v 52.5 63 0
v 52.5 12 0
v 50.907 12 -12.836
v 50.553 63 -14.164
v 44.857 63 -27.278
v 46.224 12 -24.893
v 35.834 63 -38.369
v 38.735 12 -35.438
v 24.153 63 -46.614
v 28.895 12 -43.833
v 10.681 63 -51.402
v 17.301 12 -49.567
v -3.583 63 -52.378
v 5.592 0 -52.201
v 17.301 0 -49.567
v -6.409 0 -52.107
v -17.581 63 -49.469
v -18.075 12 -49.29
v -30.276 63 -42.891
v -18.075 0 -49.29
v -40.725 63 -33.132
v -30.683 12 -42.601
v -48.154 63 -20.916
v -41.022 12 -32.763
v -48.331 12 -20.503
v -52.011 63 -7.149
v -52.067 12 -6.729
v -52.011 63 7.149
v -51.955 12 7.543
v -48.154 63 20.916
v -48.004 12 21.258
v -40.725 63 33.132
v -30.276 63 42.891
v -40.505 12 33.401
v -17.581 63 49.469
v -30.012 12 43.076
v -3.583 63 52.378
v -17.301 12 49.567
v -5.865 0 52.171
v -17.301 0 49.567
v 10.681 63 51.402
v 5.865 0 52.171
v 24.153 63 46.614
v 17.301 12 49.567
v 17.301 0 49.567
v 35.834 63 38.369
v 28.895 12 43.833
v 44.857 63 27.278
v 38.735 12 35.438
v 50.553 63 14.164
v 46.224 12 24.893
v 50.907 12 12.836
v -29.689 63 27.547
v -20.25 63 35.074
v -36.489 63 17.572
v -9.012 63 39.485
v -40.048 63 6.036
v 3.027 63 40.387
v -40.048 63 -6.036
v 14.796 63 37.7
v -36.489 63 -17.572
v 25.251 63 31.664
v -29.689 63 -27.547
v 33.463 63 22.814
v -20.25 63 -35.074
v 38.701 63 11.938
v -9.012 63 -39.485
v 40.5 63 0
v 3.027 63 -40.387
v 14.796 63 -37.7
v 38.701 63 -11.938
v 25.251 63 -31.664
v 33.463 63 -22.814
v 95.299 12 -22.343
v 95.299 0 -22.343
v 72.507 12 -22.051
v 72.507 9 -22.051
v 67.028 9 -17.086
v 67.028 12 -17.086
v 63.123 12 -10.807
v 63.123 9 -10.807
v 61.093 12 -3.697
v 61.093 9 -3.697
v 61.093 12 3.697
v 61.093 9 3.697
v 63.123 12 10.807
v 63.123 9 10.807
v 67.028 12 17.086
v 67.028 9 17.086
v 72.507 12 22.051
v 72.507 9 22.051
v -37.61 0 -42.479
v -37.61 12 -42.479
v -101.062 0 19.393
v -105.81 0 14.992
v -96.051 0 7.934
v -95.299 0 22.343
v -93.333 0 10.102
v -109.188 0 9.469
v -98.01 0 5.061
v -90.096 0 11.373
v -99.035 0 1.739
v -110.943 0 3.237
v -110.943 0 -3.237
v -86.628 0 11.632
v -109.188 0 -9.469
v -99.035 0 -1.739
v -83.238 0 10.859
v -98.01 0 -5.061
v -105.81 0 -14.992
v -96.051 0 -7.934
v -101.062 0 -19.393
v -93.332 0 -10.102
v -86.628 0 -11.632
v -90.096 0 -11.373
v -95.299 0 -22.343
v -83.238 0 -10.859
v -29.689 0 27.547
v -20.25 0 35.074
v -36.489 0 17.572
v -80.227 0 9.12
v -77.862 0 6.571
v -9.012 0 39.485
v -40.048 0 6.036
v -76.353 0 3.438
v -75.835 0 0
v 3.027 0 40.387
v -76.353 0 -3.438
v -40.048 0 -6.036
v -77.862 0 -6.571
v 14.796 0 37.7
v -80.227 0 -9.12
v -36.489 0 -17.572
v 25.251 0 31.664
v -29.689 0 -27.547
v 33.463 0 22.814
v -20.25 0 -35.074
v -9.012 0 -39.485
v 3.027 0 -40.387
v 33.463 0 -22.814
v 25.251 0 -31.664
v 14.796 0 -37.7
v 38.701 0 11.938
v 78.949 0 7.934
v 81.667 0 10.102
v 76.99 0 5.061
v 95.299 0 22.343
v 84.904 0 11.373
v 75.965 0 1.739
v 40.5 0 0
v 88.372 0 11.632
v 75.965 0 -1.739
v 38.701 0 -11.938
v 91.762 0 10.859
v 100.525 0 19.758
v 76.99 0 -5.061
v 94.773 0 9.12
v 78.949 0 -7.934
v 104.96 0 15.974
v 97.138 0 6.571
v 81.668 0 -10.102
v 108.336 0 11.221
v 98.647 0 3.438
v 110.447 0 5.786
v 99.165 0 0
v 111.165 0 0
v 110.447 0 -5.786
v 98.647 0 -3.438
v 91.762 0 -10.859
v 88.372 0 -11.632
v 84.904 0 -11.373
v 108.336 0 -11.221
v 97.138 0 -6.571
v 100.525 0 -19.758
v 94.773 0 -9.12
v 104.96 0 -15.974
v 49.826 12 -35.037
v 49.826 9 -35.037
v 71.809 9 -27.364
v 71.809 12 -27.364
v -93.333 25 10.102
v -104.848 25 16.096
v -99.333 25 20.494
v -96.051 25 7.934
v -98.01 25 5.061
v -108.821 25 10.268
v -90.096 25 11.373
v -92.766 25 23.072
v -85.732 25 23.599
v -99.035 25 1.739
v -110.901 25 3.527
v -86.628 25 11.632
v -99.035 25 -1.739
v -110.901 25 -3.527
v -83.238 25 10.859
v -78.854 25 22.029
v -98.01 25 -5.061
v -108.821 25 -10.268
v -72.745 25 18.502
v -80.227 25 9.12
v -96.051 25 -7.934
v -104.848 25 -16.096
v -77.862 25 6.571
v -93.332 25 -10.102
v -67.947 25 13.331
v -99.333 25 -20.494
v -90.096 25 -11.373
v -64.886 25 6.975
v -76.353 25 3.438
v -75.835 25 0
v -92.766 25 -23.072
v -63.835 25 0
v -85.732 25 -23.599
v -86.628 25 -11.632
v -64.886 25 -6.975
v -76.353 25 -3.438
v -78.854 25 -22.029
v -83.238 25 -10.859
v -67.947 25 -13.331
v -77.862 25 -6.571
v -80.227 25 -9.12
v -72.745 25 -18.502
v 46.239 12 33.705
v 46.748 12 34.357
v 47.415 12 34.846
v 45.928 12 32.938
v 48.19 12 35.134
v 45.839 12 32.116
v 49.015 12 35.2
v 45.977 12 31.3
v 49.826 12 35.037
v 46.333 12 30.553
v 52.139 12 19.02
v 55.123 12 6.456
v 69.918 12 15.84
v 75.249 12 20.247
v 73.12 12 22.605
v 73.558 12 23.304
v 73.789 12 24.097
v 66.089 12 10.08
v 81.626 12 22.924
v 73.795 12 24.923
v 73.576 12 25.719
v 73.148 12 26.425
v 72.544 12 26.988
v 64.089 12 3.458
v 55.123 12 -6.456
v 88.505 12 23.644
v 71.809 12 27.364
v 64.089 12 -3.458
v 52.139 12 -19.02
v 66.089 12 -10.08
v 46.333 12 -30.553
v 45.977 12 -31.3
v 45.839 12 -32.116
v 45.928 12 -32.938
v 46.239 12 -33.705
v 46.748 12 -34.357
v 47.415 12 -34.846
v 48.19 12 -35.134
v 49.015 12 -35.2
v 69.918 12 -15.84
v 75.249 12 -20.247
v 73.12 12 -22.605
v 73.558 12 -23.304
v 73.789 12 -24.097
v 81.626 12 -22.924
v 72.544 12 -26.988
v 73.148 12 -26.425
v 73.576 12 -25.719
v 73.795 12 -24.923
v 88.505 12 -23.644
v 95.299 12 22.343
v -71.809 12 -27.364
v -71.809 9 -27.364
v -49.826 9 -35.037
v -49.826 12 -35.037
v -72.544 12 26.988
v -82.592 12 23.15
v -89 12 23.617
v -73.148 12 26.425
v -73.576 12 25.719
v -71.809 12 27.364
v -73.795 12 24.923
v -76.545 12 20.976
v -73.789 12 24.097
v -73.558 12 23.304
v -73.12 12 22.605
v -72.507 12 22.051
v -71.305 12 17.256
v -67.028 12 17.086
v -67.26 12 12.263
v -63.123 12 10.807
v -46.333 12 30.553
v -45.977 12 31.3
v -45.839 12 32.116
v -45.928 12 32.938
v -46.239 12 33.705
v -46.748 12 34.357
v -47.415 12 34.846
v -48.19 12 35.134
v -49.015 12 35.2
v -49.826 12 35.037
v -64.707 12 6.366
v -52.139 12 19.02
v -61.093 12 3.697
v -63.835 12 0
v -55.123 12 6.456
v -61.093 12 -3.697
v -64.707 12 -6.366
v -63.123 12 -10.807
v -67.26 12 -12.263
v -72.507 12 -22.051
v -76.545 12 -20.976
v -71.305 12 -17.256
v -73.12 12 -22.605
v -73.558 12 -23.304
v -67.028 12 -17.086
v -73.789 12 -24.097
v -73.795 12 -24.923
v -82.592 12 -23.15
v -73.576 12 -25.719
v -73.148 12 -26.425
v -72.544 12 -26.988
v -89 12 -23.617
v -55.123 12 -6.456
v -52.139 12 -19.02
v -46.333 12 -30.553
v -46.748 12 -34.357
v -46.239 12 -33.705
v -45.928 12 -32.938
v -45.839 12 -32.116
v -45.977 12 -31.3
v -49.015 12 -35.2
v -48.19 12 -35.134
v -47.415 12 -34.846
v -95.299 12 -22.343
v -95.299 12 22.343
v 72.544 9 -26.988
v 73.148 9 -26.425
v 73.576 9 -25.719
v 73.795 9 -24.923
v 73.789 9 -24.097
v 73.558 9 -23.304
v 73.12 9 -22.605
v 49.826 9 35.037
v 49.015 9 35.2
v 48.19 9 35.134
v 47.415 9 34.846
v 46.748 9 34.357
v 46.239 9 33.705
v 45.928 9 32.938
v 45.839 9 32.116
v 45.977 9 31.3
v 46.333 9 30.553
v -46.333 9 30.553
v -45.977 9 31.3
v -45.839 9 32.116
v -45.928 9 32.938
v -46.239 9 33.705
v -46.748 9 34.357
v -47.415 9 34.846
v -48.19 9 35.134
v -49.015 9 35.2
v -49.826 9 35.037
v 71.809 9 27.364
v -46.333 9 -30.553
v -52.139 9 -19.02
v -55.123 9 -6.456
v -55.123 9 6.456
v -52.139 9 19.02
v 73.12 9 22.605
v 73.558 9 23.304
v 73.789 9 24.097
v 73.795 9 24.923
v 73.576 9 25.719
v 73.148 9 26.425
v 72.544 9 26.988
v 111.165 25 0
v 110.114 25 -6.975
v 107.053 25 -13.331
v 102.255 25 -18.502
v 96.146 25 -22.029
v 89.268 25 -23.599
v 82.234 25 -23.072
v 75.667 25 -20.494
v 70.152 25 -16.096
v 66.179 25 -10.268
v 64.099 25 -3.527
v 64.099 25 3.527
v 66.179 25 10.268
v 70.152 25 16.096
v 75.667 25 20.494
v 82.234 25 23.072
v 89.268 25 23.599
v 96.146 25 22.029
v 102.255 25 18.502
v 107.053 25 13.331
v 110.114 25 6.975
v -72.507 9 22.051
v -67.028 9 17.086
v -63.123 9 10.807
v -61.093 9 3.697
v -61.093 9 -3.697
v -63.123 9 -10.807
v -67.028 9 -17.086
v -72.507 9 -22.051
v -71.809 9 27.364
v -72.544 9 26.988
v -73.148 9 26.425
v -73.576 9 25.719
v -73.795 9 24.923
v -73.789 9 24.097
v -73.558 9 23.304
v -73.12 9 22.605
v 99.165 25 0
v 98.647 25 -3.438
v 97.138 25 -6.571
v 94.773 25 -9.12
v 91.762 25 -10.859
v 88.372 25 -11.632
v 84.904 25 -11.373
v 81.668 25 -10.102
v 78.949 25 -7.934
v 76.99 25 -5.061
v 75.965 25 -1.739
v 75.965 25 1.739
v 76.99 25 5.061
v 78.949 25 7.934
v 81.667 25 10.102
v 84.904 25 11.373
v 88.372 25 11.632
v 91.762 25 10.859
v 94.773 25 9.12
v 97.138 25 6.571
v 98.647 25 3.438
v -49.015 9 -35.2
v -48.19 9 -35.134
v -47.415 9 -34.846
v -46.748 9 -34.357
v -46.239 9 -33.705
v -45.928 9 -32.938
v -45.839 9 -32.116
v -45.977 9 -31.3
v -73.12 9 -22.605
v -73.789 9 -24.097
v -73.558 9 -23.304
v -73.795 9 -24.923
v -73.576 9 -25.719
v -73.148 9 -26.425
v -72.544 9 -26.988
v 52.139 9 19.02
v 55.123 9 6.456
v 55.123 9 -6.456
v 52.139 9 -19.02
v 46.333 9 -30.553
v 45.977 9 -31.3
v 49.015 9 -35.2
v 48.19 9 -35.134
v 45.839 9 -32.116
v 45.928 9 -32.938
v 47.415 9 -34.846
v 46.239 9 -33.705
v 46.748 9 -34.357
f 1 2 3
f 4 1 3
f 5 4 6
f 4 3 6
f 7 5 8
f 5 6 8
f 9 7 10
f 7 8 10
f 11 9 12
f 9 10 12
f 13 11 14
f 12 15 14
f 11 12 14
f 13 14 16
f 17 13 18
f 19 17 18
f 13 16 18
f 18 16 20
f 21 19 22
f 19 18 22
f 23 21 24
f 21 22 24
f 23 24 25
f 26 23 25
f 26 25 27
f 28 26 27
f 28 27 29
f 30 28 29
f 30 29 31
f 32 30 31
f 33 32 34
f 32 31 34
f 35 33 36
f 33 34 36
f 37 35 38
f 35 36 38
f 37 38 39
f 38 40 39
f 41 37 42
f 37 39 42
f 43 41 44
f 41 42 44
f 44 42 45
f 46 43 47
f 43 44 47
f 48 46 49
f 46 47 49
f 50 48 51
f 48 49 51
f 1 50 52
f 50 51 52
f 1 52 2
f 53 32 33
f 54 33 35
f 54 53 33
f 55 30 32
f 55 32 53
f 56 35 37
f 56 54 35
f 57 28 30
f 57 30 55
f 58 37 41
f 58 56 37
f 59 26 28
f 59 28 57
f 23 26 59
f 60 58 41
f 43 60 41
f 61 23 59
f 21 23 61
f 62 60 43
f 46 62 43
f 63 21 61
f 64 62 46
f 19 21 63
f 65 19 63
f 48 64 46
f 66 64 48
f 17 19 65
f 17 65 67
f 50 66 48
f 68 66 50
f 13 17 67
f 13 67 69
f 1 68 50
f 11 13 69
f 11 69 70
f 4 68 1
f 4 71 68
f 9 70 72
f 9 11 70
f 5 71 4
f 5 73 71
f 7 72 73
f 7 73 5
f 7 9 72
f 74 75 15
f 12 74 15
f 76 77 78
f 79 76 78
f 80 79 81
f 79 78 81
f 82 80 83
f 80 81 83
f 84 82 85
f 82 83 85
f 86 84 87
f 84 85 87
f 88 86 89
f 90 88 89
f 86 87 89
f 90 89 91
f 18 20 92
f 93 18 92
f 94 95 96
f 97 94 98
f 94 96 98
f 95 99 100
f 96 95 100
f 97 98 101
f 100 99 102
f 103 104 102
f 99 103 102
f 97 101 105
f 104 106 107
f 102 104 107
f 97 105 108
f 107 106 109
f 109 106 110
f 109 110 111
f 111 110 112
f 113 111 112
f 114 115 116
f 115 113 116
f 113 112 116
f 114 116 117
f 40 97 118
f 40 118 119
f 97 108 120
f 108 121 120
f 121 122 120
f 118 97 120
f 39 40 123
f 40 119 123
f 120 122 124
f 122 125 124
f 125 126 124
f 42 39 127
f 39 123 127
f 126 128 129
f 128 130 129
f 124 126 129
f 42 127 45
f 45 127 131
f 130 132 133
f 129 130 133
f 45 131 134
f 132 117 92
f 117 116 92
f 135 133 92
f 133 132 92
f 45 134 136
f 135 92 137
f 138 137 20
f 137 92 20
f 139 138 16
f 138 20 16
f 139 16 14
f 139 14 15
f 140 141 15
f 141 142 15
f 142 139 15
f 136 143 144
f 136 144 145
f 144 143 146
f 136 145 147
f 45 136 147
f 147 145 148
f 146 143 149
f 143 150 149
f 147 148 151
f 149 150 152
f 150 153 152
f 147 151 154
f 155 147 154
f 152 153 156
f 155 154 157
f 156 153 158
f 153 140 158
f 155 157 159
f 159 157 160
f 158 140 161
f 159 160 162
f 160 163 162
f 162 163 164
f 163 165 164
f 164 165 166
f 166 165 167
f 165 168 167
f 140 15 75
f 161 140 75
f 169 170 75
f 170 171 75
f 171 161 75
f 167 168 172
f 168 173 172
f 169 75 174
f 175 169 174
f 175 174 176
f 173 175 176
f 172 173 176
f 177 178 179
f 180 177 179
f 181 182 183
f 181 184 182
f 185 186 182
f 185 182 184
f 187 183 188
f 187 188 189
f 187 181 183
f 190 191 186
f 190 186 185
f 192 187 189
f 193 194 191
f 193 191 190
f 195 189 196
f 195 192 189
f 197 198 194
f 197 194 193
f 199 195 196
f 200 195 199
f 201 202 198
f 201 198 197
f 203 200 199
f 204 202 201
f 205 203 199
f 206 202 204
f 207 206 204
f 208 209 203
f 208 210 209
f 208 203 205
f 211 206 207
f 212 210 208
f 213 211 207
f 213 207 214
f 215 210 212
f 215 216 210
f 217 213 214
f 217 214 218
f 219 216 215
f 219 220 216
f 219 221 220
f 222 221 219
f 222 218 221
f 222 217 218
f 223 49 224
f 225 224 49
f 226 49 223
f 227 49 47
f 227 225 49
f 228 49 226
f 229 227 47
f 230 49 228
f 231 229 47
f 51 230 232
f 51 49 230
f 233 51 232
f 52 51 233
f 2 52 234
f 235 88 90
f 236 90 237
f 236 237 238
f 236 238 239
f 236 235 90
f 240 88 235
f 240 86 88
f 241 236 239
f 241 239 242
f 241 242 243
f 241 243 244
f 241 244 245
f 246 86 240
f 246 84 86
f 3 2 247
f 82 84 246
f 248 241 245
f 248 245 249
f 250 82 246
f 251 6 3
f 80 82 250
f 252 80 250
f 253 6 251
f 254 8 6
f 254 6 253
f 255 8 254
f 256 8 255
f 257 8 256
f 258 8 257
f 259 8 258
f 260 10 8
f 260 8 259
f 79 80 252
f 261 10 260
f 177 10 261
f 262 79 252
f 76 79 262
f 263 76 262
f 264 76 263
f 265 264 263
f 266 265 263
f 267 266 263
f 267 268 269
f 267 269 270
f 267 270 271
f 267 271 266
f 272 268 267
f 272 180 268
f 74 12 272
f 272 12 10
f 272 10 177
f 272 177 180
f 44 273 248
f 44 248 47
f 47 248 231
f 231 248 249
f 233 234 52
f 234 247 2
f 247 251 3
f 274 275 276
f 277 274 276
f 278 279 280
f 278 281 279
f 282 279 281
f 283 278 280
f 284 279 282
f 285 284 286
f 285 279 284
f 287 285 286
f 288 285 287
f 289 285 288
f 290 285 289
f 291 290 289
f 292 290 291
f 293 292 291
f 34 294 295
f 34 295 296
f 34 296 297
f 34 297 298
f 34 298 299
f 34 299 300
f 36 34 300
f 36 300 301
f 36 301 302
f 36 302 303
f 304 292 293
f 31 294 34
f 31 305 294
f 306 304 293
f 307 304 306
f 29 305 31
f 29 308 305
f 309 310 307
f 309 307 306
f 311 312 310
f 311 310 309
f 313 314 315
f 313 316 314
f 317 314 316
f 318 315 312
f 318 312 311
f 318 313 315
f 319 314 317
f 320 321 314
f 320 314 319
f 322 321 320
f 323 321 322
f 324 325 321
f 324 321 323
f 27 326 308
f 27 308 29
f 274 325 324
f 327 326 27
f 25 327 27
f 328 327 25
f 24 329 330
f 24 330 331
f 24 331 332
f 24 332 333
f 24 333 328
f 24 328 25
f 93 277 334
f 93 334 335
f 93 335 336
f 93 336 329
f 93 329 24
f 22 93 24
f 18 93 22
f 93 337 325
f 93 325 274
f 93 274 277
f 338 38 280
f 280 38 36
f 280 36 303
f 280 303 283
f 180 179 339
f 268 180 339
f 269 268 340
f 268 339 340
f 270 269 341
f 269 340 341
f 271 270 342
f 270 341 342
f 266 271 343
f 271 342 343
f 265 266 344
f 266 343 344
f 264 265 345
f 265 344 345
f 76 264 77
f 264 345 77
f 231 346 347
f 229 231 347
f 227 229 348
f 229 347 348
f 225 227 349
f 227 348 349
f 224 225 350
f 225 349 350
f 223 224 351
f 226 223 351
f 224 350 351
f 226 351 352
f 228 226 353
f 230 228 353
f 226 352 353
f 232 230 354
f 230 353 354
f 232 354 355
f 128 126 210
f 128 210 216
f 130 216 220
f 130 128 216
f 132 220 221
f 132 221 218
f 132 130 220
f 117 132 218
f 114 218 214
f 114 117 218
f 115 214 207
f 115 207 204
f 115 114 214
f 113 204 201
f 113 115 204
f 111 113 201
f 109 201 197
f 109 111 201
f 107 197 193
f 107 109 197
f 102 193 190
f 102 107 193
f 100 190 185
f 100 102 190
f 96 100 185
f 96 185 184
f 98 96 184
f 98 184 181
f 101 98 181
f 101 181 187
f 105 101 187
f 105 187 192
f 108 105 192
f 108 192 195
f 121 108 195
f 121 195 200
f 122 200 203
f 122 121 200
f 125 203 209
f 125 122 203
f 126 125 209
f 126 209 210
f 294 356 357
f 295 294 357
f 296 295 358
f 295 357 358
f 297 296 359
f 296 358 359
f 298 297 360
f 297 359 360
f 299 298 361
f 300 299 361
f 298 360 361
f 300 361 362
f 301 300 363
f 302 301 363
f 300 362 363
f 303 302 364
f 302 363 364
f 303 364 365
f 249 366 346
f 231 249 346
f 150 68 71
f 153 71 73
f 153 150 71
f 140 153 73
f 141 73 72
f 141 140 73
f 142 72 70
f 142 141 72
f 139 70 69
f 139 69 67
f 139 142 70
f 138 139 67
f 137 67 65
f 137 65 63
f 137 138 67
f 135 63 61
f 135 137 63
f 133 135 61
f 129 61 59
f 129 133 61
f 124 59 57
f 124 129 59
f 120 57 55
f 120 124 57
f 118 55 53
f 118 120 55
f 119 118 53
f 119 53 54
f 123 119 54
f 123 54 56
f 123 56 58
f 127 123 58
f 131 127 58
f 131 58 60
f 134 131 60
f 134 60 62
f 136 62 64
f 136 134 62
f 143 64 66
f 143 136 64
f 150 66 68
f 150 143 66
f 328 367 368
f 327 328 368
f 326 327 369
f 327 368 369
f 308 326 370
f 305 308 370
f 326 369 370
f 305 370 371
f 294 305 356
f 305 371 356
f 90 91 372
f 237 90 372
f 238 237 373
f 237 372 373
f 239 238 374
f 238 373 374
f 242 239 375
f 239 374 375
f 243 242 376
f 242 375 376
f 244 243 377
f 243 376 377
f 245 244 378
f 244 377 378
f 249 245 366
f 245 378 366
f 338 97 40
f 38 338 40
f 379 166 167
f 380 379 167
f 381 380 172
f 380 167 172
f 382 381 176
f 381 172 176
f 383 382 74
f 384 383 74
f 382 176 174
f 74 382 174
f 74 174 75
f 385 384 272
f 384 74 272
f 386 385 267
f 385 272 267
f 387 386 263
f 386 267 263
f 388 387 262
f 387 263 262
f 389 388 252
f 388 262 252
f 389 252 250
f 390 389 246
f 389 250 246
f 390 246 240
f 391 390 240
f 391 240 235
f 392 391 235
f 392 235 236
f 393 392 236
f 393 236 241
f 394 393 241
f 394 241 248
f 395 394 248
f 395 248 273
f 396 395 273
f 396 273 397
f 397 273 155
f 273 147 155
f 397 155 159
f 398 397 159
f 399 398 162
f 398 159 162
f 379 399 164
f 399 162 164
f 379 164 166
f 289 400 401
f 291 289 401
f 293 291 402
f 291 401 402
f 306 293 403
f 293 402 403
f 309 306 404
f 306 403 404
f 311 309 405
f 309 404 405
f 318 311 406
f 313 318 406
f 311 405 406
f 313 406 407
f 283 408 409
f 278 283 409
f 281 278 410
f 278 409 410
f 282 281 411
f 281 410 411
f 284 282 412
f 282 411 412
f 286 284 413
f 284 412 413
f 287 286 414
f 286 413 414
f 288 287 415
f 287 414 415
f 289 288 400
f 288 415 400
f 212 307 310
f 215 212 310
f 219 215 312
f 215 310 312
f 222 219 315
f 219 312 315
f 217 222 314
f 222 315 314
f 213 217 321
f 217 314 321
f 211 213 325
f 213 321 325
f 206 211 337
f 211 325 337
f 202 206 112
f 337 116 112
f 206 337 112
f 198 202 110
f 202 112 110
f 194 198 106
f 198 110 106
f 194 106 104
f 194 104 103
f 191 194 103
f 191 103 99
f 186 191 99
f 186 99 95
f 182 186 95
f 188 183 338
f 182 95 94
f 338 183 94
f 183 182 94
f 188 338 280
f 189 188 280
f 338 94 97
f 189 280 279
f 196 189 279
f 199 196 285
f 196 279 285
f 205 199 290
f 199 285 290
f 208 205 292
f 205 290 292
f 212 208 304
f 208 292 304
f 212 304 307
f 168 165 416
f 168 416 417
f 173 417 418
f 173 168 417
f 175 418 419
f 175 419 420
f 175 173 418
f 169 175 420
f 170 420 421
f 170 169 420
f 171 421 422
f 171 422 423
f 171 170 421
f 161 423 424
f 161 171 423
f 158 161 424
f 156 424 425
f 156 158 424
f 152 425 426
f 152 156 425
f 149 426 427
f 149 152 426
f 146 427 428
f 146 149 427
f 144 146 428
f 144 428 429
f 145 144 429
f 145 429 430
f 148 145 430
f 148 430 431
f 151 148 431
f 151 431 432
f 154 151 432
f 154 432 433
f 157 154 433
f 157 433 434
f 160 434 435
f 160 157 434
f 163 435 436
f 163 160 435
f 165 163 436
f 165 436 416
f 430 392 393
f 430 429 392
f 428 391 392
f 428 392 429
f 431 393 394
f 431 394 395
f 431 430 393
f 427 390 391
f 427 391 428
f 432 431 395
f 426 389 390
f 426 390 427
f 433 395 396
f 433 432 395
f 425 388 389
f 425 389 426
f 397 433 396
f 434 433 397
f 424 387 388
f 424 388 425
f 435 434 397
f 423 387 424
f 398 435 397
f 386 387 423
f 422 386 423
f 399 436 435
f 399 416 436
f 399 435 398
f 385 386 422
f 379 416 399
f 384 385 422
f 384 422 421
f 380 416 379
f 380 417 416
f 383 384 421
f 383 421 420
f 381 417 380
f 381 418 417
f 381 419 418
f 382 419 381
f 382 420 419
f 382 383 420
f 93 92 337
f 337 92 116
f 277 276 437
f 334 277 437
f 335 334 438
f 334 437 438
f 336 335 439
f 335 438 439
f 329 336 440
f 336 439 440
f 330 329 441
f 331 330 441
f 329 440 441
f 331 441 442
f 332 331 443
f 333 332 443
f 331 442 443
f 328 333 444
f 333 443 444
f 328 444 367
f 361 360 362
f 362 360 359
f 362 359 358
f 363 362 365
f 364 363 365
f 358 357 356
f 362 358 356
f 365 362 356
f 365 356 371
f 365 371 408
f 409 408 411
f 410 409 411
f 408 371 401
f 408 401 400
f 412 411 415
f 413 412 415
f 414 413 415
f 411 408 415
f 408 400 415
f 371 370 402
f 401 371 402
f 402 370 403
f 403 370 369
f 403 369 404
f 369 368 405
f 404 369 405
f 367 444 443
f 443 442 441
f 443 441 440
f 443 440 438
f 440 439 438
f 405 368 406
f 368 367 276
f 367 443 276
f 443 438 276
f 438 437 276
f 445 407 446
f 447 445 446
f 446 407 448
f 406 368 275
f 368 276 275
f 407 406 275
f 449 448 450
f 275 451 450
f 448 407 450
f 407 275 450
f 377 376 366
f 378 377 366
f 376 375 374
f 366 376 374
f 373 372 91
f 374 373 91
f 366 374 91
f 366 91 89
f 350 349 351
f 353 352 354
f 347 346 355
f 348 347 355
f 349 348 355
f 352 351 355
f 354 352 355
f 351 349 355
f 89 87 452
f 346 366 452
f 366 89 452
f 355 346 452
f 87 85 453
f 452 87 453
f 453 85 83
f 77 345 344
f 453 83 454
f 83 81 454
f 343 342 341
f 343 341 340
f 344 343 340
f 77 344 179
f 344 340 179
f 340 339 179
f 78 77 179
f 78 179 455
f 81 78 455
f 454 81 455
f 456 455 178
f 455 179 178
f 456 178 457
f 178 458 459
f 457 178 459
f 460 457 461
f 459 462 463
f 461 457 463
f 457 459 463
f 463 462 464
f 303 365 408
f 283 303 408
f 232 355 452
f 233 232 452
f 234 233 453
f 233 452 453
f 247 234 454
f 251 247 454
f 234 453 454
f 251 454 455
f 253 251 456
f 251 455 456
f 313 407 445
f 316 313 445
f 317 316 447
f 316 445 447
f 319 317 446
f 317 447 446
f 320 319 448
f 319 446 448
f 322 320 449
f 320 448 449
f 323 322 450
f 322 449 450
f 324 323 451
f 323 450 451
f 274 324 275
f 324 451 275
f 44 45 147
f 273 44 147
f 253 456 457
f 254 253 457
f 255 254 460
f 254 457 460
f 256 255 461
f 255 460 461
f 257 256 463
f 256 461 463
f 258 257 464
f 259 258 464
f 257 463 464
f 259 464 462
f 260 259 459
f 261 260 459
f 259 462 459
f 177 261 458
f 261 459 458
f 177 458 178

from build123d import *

# Parameters (mm, degrees)
BOSS_EXTRUDE1_DEPTH = 12
BOSS_EXTRUDE2_DEPTH = 9
BOSS_EXTRUDE3_DEPTH = 12
SKETCH1_5_R         = 40.5
BOSS_EXTRUDE4_DEPTH = 63
SKETCH1_6_R         = 23.665
SKETCH1_6_R_2       = 11.665
BOSS_EXTRUDE5_DEPTH = 25


with BuildPart() as part:
    # Sketch1 → Boss-Extrude1 (new body)
    with BuildSketch(Plane(origin=(0, 0, 0), x_dir=(1, 0, 0), z_dir=(0, 1, 0))):
        with BuildLine():
            Line((95.298631714, 22.343087709), (17.301, 49.56738241))
            ThreePointArc((17.301, 49.56738241), (42.805096075, 30.396936523), (52.5, 0))
            ThreePointArc((52.5, 0), (42.805096075, -30.396936523), (17.301, -49.56738241))
            Line((17.301, -49.56738241), (95.298631714, -22.343087709))
            ThreePointArc((95.298631714, -22.343087709), (63.835, 0), (95.298631714, 22.343087709))
        make_face()
        with BuildLine():
            Line((71.809327621, -27.364302024), (49.82603874, -35.037349549))
            ThreePointArc((49.82603874, -35.037349549), (46.470783868, -34.048587089), (46.332927596, -30.553392944))
            ThreePointArc((46.332927596, -30.553392944), (55.5, 0), (46.332927596, 30.553392944))
            ThreePointArc((46.332927596, 30.553392944), (46.470783868, 34.048587089), (49.82603874, 35.037349549))
            Line((49.82603874, 35.037349549), (71.809327621, 27.364302024))
            ThreePointArc((71.809327621, 27.364302024), (73.795133067, 24.922702734), (72.507464694, 22.050988869))
            ThreePointArc((72.507464694, 22.050988869), (60.835, 0), (72.507464694, -22.050988869))
            ThreePointArc((72.507464694, -22.050988869), (73.795133067, -24.922702734), (71.809327621, -27.364302024))
        make_face(mode=Mode.SUBTRACT)
    extrude(amount=BOSS_EXTRUDE1_DEPTH)

    # Sketch1<3> → Boss-Extrude2 (add)
    with BuildSketch(Plane(origin=(0, 0, 0), x_dir=(1, 0, 0), z_dir=(0, 1, 0))):
        with BuildLine():
            Line((-49.82603874, 35.037349549), (-71.809327621, 27.364302024))
            ThreePointArc((-71.809327621, 27.364302024), (-73.795133067, 24.922702734), (-72.507464694, 22.050988869))
            ThreePointArc((-72.507464694, 22.050988869), (-60.835, 0), (-72.507464694, -22.050988869))
            ThreePointArc((-72.507464694, -22.050988869), (-73.795133067, -24.922702734), (-71.809327621, -27.364302024))
            Line((-71.809327621, -27.364302024), (-49.82603874, -35.037349549))
            ThreePointArc((-49.82603874, -35.037349549), (-46.470783868, -34.048587089), (-46.332927596, -30.553392944))
            ThreePointArc((-46.332927596, -30.553392944), (-55.5, 0), (-46.332927596, 30.553392944))
            ThreePointArc((-46.332927596, 30.553392944), (-46.470783868, 34.048587089), (-49.82603874, 35.037349549))
        make_face()
        with BuildLine():
            ThreePointArc((46.332927596, -30.553392944), (46.470783868, -34.048587089), (49.82603874, -35.037349549))
            Line((49.82603874, -35.037349549), (71.809327621, -27.364302024))
            ThreePointArc((71.809327621, -27.364302024), (73.795133067, -24.922702734), (72.507464694, -22.050988869))
            ThreePointArc((72.507464694, -22.050988869), (60.835, 0), (72.507464694, 22.050988869))
            ThreePointArc((72.507464694, 22.050988869), (73.795133067, 24.922702734), (71.809327621, 27.364302024))
            Line((71.809327621, 27.364302024), (49.82603874, 35.037349549))
            ThreePointArc((49.82603874, 35.037349549), (46.470783868, 34.048587089), (46.332927596, 30.553392944))
            ThreePointArc((46.332927596, 30.553392944), (55.5, 0), (46.332927596, -30.553392944))
        make_face()
    extrude(amount=BOSS_EXTRUDE2_DEPTH)


with BuildPart() as boss_extrude2_piece_1:
    # of the separate pieces the step leaves, piece 1, a body of its own (boss_extrude2_pieces)
    add(part.part.solids().sort_by_distance((17.301, 0, 49.56738241))[0])



with BuildPart() as boss_extrude2_piece_2:
    # of the separate pieces the step leaves, piece 2, a body of its own (boss_extrude2_pieces)
    add(part.part.solids().sort_by_distance((-46.332927596, 0, -30.553392944))[0])

    # Sketch1<4> → Boss-Extrude3 (add)
    with BuildSketch(Plane(origin=(0, 0, 0), x_dir=(1, 0, 0), z_dir=(0, 1, 0))):
        with BuildLine():
            Line((-37.609789084, 42.478802323), (-95.298631714, 22.343087709))
            ThreePointArc((-95.298631714, 22.343087709), (-73.798218994, 19.29490664), (-63.835, 0))
            ThreePointArc((-63.835, 0), (-73.798218994, -19.29490664), (-95.298631714, -22.343087709))
            Line((-95.298631714, -22.343087709), (-17.301, -49.56738241))
            ThreePointArc((-17.301, -49.56738241), (-52.498391324, -0.410984604), (-18.074910259, 49.290441458))
            Line((-18.074910259, 49.290441458), (-37.609789084, 42.478802323))
        make_face()
        with BuildLine():
            ThreePointArc((-72.507464694, 22.050988869), (-73.795133067, 24.922702734), (-71.809327621, 27.364302024))
            Line((-71.809327621, 27.364302024), (-49.82603874, 35.037349549))
            ThreePointArc((-49.82603874, 35.037349549), (-46.470783868, 34.048587089), (-46.332927596, 30.553392944))
            ThreePointArc((-46.332927596, 30.553392944), (-55.5, 0), (-46.332927596, -30.553392944))
            ThreePointArc((-46.332927596, -30.553392944), (-46.470783868, -34.048587089), (-49.82603874, -35.037349549))
            Line((-49.82603874, -35.037349549), (-71.809327621, -27.364302024))
            ThreePointArc((-71.809327621, -27.364302024), (-73.795133067, -24.922702734), (-72.507464694, -22.050988869))
            ThreePointArc((-72.507464694, -22.050988869), (-60.835, 0), (-72.507464694, 22.050988869))
        make_face(mode=Mode.SUBTRACT)
    extrude(amount=BOSS_EXTRUDE3_DEPTH)


with BuildPart() as boss_extrude2_piece_1_1:
    add(boss_extrude2_piece_1.part)

    add(boss_extrude2_piece_2.part)  # Boss-Extrude4 merges Boss-Extrude2 piece 2
    # Sketch1<5> → Boss-Extrude4 (add)
    with BuildSketch(Plane(origin=(0, 0, 0), x_dir=(1, 0, 0), z_dir=(0, 1, 0))):
        with BuildLine():
            ThreePointArc((17.301, 49.56738241), (-0.410984604, 52.498391324), (-18.074910259, 49.290441458))
            ThreePointArc((-18.074910259, 49.290441458), (-52.498391324, -0.410984604), (-17.301, -49.56738241))
            ThreePointArc((-17.301, -49.56738241), (0, -52.5), (17.301, -49.56738241))
            ThreePointArc((17.301, -49.56738241), (42.805096075, -30.396936523), (52.5, 0))
            ThreePointArc((52.5, 0), (42.805096075, 30.396936523), (17.301, 49.56738241))
        make_face()
        Circle(SKETCH1_5_R, mode=Mode.SUBTRACT)
    extrude(amount=BOSS_EXTRUDE4_DEPTH)

    # Sketch1<6> → Boss-Extrude5 (add)
    # profile 1 of 2: a face of its own
    with BuildSketch(Plane(origin=(0, 0, 0), x_dir=(1, 0, 0), z_dir=(0, 1, 0))):
        with Locations((-87.5, 0)):
            Circle(SKETCH1_6_R)
        with Locations((-87.5, 0)):
            Circle(SKETCH1_6_R_2, mode=Mode.SUBTRACT)
    # profile 2 of 2: a face of its own
    with BuildSketch(Plane(origin=(0, 0, 0), x_dir=(1, 0, 0), z_dir=(0, 1, 0))):
        with Locations((87.5, 0)):
            Circle(SKETCH1_6_R)
        with Locations((87.5, 0)):
            Circle(SKETCH1_6_R_2, mode=Mode.SUBTRACT)
    extrude(amount=BOSS_EXTRUDE5_DEPTH)


solid = boss_extrude2_piece_1_1.part
